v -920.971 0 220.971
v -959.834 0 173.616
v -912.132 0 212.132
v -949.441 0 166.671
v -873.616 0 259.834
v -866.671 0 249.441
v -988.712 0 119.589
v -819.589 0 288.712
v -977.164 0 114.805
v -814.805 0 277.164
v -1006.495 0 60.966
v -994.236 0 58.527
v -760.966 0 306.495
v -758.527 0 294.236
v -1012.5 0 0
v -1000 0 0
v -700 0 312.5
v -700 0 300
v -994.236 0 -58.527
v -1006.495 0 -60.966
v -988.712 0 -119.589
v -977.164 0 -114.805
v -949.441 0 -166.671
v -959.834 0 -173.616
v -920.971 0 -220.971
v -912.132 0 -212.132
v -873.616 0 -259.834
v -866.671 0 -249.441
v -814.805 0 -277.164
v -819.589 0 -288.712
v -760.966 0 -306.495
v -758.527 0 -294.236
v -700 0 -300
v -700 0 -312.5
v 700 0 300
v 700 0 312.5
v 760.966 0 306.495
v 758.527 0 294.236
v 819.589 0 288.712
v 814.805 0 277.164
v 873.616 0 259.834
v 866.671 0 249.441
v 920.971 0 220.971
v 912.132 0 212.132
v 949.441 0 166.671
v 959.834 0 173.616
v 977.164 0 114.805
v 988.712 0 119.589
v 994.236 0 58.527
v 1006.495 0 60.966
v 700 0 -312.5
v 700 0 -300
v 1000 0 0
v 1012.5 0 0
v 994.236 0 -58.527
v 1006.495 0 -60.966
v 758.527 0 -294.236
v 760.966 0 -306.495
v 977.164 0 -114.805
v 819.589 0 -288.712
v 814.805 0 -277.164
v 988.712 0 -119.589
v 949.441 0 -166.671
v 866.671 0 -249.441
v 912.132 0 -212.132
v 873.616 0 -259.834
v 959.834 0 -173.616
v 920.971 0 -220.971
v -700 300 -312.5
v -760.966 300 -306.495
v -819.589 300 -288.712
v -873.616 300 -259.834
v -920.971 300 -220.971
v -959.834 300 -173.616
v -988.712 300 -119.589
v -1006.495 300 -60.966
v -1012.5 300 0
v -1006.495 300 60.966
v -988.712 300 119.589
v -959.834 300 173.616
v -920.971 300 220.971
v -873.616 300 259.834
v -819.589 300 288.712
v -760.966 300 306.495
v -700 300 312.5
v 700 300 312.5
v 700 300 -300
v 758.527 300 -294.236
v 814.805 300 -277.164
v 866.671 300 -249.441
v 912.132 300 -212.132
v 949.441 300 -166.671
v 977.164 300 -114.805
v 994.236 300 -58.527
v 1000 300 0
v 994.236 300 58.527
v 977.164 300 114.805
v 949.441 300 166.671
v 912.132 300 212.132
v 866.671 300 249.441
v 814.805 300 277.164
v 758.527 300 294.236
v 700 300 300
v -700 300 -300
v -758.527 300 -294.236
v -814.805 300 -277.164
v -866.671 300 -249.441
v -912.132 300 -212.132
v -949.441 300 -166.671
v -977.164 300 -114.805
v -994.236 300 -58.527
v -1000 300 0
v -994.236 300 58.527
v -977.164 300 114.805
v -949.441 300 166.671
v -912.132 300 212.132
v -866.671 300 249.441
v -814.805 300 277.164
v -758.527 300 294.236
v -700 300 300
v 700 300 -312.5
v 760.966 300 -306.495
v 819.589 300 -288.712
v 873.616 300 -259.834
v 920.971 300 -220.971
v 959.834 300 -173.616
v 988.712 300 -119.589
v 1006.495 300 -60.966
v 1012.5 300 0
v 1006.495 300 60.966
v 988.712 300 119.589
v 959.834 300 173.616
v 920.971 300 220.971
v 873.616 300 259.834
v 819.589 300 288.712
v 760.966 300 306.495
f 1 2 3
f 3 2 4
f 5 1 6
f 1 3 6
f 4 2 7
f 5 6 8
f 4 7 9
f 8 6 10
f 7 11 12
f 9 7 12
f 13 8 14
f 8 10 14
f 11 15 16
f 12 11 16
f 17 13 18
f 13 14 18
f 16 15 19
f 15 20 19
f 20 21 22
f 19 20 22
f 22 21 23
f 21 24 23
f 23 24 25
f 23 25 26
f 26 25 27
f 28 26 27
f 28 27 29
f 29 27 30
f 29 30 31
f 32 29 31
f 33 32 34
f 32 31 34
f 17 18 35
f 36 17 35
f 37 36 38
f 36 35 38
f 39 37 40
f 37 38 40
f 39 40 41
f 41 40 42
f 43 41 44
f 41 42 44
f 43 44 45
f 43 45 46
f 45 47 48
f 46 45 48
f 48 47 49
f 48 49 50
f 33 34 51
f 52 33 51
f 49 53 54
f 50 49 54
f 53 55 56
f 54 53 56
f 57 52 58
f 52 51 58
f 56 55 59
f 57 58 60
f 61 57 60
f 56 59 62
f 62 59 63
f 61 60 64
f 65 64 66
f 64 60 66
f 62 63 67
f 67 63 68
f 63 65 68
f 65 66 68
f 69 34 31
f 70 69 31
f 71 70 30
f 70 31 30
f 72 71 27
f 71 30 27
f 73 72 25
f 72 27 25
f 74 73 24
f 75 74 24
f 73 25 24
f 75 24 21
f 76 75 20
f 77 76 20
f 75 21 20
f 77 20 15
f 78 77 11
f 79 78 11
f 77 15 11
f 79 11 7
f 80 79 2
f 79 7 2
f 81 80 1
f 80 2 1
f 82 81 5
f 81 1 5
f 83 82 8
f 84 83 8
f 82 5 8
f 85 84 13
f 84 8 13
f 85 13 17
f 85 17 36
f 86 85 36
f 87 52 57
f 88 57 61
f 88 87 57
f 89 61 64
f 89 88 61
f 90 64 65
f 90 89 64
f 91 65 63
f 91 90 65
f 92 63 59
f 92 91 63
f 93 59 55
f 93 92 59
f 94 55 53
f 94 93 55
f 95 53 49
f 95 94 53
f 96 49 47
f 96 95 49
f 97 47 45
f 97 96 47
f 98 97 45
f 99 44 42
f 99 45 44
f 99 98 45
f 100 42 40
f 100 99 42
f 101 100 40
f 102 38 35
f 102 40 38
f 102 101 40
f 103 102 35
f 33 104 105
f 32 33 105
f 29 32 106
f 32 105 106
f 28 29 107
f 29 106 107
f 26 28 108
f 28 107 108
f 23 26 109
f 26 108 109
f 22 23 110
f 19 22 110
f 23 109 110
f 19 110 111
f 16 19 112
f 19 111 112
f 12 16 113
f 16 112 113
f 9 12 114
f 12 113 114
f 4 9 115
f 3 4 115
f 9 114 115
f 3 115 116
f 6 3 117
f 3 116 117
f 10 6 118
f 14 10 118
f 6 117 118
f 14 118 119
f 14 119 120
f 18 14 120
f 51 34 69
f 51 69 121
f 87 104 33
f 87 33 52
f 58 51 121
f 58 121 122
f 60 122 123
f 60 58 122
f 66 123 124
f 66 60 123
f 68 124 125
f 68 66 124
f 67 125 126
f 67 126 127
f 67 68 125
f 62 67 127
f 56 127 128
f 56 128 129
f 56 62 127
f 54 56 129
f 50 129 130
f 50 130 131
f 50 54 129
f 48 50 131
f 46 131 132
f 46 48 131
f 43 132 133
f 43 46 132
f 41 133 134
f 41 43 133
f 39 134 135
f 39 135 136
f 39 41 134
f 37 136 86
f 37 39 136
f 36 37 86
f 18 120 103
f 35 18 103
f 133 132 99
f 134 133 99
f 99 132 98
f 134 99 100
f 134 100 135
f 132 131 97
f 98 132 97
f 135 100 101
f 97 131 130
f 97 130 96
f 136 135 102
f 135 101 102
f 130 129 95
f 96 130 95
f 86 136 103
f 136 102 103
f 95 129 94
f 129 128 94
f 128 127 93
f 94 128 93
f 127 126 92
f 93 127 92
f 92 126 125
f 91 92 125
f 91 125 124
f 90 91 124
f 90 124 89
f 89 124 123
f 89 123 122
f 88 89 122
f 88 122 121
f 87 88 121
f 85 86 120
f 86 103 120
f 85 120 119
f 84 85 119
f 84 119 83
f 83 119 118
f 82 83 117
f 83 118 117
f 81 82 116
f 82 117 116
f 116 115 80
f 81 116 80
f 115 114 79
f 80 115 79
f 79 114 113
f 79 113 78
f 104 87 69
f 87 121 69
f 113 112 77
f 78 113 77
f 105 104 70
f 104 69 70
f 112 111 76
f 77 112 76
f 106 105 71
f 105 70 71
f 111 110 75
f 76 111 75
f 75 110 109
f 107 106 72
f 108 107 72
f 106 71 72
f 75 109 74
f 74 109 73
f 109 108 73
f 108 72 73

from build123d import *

# Parameters (mm, degrees)
SKIZZE3_W                       = 1400
SKIZZE3_H                       = 625
AUFSATZ_LINEAR_AUSTRAGEN1_DEPTH = 300
SKIZZE4_R                       = 312.5
AUFSATZ_LINEAR_AUSTRAGEN2_DEPTH = 300
SKIZZE5_W                       = 1400
SKIZZE5_H                       = 600
SCHNITT_LINEAR_AUSTRAGEN1_DEPTH = 1102.277667076
SKIZZE6_R                       = 300
SCHNITT_LINEAR_AUSTRAGEN2_DEPTH = 1102.277667076


with BuildPart() as part:
    # Skizze3 → Aufsatz-Linear austragen1 (new body)
    with BuildSketch(Plane(origin=(0, 0, 0), x_dir=(1, 0, 0), z_dir=(0, 1, 0))):
        Rectangle(SKIZZE3_W, SKIZZE3_H)
    extrude(amount=AUFSATZ_LINEAR_AUSTRAGEN1_DEPTH)

    # Skizze4 → Aufsatz-Linear austragen2 (add)
    with BuildSketch(Plane(origin=(0, 0, 0), x_dir=(1, 0, 0), z_dir=(0, 1, 0))):
        with Locations((-700, 0)):
            Circle(SKIZZE4_R)
    aufsatz_linear_austragen2 = extrude(amount=AUFSATZ_LINEAR_AUSTRAGEN2_DEPTH)

    # Spiegeln1: Aufsatz-Linear austragen2 across plane
    add(aufsatz_linear_austragen2.mirror(Plane(origin=(0, 0, 0), x_dir=(0, 0, 1), z_dir=(1, 0, 0))))

    # Skizze5 → Schnitt-Linear austragen1 (cut, through all)
    with BuildSketch(Plane(origin=(0, 300, 0), x_dir=(1, 0, 0), z_dir=(0, 1, 0))):
        Rectangle(SKIZZE5_W, SKIZZE5_H)
    extrude(amount=-SCHNITT_LINEAR_AUSTRAGEN1_DEPTH, mode=Mode.SUBTRACT)

    # Skizze6 → Schnitt-Linear austragen2 (cut, through all)
    with BuildSketch(Plane(origin=(0, 300, 0), x_dir=(1, 0, 0), z_dir=(0, 1, 0))):
        with Locations((-700, 0)):
            Circle(SKIZZE6_R)
    schnitt_linear_austragen2 = extrude(amount=-SCHNITT_LINEAR_AUSTRAGEN2_DEPTH, mode=Mode.SUBTRACT)

    # Spiegeln2: Schnitt-Linear austragen2 across plane
    add(schnitt_linear_austragen2.mirror(Plane(origin=(0, 0, 0), x_dir=(0, 0, 1), z_dir=(1, 0, 0))), mode=Mode.SUBTRACT)


solid = part.part
